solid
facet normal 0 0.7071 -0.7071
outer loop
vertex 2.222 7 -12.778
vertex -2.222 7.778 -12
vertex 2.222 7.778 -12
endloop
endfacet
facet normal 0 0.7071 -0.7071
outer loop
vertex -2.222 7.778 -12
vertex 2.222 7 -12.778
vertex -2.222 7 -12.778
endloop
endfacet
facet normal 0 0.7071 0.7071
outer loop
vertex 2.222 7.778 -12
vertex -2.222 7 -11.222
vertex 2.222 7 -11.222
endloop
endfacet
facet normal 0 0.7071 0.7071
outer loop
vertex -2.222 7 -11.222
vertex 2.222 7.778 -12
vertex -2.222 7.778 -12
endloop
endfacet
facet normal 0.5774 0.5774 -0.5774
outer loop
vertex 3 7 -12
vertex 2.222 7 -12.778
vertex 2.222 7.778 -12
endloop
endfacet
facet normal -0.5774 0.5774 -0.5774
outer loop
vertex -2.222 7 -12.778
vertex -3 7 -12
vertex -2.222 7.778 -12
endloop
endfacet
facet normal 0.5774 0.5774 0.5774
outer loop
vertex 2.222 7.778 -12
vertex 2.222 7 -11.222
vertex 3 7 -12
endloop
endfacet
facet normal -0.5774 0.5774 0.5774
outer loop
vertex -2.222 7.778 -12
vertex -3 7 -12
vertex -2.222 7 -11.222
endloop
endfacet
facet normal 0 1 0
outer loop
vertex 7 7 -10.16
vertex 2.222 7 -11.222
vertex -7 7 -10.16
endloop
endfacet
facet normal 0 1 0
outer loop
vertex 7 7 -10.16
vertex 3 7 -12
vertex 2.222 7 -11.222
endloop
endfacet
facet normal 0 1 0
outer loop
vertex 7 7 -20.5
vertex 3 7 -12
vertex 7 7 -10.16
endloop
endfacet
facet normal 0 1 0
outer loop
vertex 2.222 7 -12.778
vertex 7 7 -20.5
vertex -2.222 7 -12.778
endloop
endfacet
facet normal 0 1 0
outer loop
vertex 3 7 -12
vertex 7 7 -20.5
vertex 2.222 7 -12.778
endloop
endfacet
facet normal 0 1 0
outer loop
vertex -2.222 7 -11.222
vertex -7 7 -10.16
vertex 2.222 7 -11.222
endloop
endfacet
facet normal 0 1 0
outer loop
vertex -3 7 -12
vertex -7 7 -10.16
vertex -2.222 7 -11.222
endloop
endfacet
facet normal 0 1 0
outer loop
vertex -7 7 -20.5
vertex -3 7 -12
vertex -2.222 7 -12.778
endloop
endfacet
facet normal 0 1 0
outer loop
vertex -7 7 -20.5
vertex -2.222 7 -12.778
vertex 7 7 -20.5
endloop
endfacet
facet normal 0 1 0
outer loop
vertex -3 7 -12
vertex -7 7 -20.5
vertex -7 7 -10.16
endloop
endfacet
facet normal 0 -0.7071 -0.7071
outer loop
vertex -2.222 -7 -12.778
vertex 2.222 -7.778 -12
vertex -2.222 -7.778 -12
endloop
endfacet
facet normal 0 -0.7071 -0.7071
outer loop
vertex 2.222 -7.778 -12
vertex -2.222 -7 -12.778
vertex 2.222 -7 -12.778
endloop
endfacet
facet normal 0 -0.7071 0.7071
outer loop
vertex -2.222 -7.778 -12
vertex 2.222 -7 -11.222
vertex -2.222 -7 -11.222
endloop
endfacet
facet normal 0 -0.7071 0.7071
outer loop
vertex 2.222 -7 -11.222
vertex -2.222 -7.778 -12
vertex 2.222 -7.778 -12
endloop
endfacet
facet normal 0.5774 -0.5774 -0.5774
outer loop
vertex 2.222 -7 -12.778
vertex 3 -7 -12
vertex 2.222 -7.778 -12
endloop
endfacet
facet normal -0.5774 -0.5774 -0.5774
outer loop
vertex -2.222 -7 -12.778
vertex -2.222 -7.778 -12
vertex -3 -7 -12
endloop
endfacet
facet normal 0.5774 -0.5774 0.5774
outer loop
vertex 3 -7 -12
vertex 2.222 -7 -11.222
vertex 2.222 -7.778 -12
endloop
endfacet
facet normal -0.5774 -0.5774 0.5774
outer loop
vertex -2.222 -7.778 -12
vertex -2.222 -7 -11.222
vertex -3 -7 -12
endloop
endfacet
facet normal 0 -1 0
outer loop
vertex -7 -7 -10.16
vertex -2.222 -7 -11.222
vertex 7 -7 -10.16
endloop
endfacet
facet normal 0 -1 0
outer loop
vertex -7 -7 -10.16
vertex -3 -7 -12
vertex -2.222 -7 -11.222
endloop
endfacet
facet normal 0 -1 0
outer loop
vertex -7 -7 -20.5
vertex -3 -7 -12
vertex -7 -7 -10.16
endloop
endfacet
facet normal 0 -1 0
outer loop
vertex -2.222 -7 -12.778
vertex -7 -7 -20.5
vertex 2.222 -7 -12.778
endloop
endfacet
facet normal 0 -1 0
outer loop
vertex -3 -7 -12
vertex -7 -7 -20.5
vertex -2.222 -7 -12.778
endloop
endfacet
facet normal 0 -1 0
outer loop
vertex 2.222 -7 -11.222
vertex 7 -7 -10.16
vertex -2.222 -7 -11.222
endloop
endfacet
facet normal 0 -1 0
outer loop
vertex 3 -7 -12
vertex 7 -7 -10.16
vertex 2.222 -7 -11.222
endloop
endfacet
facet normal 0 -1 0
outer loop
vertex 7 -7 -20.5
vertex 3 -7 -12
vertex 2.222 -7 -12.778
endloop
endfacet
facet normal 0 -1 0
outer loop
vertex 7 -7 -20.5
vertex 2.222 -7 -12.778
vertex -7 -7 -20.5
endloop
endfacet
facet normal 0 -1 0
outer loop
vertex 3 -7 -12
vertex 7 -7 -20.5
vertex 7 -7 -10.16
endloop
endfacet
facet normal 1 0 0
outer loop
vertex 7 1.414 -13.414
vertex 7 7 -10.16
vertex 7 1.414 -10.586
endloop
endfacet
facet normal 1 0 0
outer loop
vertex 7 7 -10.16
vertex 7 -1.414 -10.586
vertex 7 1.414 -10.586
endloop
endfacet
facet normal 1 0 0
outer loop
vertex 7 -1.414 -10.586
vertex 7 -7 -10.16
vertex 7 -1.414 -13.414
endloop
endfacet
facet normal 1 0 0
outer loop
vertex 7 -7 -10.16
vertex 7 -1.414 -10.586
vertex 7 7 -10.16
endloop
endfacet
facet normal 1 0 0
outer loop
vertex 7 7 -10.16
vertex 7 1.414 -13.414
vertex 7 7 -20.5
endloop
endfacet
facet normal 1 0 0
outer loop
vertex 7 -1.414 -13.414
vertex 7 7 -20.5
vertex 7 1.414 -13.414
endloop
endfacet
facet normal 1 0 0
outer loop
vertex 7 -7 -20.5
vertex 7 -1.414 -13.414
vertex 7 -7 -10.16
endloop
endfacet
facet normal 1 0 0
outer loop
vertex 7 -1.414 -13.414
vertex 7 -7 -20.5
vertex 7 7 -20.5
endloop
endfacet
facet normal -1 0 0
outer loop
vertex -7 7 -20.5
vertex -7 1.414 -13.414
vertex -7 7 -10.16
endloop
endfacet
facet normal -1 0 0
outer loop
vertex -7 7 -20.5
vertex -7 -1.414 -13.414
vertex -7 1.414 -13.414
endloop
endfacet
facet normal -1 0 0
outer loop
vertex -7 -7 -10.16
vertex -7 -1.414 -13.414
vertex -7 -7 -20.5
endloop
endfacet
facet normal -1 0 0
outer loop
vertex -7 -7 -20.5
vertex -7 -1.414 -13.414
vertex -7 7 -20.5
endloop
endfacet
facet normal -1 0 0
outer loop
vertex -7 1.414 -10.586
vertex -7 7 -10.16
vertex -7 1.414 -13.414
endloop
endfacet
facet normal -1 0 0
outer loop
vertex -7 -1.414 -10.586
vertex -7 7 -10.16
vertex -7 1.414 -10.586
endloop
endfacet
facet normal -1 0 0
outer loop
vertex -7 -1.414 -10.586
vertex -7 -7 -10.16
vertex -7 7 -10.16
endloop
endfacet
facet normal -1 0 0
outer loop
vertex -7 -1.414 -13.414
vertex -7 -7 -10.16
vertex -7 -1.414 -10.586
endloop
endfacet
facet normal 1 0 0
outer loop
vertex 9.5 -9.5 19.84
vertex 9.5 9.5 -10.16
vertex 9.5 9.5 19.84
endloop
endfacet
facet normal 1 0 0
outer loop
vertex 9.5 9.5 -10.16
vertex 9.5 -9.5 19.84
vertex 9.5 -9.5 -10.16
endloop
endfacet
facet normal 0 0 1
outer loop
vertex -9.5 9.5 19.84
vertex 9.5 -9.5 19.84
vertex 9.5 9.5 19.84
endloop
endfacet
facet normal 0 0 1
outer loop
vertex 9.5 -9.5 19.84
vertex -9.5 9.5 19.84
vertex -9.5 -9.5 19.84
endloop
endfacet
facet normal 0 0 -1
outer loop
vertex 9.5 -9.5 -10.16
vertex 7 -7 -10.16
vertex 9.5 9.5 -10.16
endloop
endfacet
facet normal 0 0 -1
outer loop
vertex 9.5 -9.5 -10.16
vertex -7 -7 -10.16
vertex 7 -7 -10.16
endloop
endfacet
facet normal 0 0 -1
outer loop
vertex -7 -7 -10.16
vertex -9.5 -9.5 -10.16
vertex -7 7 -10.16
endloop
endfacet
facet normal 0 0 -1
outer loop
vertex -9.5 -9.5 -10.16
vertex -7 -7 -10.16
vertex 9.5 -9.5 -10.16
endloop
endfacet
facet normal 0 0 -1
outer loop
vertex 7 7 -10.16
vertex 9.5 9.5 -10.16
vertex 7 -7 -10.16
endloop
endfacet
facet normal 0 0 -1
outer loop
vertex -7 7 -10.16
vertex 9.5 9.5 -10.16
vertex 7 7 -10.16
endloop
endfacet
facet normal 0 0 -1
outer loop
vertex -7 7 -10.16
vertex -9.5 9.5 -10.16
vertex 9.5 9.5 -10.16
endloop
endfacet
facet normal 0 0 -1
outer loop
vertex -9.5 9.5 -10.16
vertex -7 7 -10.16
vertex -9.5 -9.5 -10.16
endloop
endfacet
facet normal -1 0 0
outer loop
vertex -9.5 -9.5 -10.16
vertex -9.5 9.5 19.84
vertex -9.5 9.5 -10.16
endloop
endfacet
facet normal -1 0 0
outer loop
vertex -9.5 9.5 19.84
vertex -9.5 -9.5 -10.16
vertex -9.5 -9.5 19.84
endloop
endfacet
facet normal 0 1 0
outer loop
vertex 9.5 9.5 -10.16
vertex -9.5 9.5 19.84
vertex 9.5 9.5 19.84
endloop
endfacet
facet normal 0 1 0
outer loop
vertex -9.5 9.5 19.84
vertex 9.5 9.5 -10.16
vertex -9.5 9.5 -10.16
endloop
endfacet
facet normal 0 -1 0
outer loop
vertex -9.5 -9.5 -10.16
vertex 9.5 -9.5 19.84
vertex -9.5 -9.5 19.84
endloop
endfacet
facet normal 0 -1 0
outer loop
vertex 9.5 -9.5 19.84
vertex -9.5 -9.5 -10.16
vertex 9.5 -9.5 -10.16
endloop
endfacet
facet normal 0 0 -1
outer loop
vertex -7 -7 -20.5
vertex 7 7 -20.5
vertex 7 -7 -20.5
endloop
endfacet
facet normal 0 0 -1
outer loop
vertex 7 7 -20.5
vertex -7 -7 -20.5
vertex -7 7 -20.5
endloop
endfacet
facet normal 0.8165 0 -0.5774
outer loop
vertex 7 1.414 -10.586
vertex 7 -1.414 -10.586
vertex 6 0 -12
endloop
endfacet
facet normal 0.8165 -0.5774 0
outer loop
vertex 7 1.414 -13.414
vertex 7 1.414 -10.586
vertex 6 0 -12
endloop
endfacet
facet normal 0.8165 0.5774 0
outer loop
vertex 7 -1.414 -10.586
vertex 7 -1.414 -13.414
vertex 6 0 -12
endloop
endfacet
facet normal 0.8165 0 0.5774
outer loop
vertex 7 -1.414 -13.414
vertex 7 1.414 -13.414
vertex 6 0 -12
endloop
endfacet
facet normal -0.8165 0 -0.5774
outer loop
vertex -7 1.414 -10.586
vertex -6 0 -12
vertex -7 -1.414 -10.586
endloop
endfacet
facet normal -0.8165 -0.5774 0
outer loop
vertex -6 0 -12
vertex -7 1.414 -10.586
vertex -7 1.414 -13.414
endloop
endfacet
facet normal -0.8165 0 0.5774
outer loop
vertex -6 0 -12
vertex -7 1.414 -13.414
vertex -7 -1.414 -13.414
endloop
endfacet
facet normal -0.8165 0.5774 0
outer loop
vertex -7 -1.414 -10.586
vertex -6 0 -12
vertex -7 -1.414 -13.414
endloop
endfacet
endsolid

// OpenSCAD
/*
 * A blockout used for creating Cherry MX keyswitch receptacles in solid objects.
 * Dimensions referenced and approximate those used by gcb's switch_mx.scad:
 * https://bitbucket.org/gcb/3dump/src/8c0555016ecb091764b122b7b80777f2fc6ce9c2/keyboards/cherry/switch_mx.scad
 */

module copymirror(v) {
    children();
    mirror(v) children();
}
module cmxsw() {}
module cherry_mx_keyhole() {
    color("red") difference() {
        union() {
            // body
            translate([0,0,-9.3-5.5/2]) cube([14,14,5.5],true);
            // cap clearance
            translate([0,0,30/2-10.16]) cube([19,19,30], true);
            // pin clearance
            translate([0,0,-14.5-6/2]) cube([14,14,6], true);
            // clips
            copymirror([0,-1,0]) translate([0,7,-12]) intersection() {
                rotate([45,0,0]) cube([6,1.1,1.1], true);
                rotate([-90,0,0]) cylinder(3,3,0,$fn=4);
            }
        }
        // recesses
        copymirror([-1,0,0]) translate([7,0,-12]) rotate([45,0,0]) rotate([0,-90,0]) cylinder(1,2,0,$fn=4);
    }
}

cherry_mx_keyhole();
